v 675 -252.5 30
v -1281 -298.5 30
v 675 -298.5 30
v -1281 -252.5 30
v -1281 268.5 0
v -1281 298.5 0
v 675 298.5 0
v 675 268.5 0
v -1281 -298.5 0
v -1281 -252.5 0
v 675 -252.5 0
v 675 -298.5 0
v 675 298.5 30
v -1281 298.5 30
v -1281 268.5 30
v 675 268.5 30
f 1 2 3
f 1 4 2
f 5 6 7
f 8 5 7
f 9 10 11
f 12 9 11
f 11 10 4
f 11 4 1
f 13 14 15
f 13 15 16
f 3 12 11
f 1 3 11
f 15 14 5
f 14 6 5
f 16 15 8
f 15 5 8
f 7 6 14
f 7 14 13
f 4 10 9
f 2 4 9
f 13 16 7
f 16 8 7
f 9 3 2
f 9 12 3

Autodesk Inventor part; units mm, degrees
ref_plane "YZ Plane" through (0, 0, 0) normal (1, 0, 0) x (0, 1, 0)
ref_plane "XZ Plane" through (0, 0, 0) normal (0, 1, 0) x (-1, 0, 0)
ref_plane "Plano de trabajo1" through (0, 0, 0) normal (0, 0, 1) x (1, 0, 0)
sketch "Boceto1" plane through (0, 0, 0) normal (0, 0, 1) x (1, 0, 0)
  line L0 (700, 298.5) -> (700, -298.5) projected
  line L1 (-743, 298.5) -> (700, 298.5) projected
  line L2 (-743, -298.5) -> (-743, 298.5) projected
  line L3 (700, -298.5) -> (-700, -298.5) projected
  line L4 (700, -298.5) -> (675, -298.5) projected
  line L5 (700, 298.5) -> (700, -298.5) projected
  line L6 (675, 298.5) -> (700, 298.5) projected
  line L7 (675, -298.5) -> (675, 298.5) projected
  line L8 (-700, 1251.5) -> (-700, -298.5) projected
  line L9 (-1297, 1251.5) -> (-700, 1251.5) projected
  line L10 (-1297, -358.5) -> (-1297, 1251.5) projected
  line L11 (-700, -298.5) -> (-1297, -298.5) projected
  line L12 (-1281, 1176.5) -> (-1281, -358.5) projected
  line L13 (-1297, 1176.5) -> (-1281, 1176.5) projected
  line L14 (-1297, -358.5) -> (-1297, 1176.5) projected
  line L15 (-1281, -358.5) -> (-1297, -358.5) projected
  line L16 (675, 298.5) -> (-1281, 298.5)
  line L17 (-1281, 298.5) -> (-1281, 268.5)
  line L18 (-1281, 268.5) -> (675, 268.5)
  line L19 (675, 268.5) -> (675, 298.5)
  line L20 (675, -298.5) -> (-1324, -298.5) projected
  line L21 (675, -282.5) -> (675, -298.5) projected
  line L22 (-1324, -282.5) -> (675, -282.5) projected
  line L23 (675, -282.5) -> (-1281, -282.5)
  line L24 (-1281, -282.5) -> (-1281, -252.5)
  line L25 (-1281, -252.5) -> (675, -252.5)
  line L26 (675, -252.5) -> (675, -282.5)
  line L27 (-1324, -298.5) -> (-1324, -282.5) projected
  point P0 (0, 0)
  point P1 (-1281, -282.5)
  point P2 (-1297, -282.5)
  point P3 (-1281, -282.5)
  point P4 (-1281, -282.5)
  point P5 (-1281, -298.5)
  point P6 (-1281, -282.5)
  dimension "d0" = 30
  dimension "d1" = 30
extrude "Extrusión1" add sketch "Boceto1" along normal blind 30 contours L7 L18 L8 L1 | L3 L8 L22 L7 | L8 L18 L2 L1 | L11 L2 L22 L8 | L22 L8 L25 L7 | L2 L18 L12 L16 | L22 L2 L25 L8 | L11 L12 L22 L2 | L22 L12 L25 L2
properties part number "BarrasLargas"
